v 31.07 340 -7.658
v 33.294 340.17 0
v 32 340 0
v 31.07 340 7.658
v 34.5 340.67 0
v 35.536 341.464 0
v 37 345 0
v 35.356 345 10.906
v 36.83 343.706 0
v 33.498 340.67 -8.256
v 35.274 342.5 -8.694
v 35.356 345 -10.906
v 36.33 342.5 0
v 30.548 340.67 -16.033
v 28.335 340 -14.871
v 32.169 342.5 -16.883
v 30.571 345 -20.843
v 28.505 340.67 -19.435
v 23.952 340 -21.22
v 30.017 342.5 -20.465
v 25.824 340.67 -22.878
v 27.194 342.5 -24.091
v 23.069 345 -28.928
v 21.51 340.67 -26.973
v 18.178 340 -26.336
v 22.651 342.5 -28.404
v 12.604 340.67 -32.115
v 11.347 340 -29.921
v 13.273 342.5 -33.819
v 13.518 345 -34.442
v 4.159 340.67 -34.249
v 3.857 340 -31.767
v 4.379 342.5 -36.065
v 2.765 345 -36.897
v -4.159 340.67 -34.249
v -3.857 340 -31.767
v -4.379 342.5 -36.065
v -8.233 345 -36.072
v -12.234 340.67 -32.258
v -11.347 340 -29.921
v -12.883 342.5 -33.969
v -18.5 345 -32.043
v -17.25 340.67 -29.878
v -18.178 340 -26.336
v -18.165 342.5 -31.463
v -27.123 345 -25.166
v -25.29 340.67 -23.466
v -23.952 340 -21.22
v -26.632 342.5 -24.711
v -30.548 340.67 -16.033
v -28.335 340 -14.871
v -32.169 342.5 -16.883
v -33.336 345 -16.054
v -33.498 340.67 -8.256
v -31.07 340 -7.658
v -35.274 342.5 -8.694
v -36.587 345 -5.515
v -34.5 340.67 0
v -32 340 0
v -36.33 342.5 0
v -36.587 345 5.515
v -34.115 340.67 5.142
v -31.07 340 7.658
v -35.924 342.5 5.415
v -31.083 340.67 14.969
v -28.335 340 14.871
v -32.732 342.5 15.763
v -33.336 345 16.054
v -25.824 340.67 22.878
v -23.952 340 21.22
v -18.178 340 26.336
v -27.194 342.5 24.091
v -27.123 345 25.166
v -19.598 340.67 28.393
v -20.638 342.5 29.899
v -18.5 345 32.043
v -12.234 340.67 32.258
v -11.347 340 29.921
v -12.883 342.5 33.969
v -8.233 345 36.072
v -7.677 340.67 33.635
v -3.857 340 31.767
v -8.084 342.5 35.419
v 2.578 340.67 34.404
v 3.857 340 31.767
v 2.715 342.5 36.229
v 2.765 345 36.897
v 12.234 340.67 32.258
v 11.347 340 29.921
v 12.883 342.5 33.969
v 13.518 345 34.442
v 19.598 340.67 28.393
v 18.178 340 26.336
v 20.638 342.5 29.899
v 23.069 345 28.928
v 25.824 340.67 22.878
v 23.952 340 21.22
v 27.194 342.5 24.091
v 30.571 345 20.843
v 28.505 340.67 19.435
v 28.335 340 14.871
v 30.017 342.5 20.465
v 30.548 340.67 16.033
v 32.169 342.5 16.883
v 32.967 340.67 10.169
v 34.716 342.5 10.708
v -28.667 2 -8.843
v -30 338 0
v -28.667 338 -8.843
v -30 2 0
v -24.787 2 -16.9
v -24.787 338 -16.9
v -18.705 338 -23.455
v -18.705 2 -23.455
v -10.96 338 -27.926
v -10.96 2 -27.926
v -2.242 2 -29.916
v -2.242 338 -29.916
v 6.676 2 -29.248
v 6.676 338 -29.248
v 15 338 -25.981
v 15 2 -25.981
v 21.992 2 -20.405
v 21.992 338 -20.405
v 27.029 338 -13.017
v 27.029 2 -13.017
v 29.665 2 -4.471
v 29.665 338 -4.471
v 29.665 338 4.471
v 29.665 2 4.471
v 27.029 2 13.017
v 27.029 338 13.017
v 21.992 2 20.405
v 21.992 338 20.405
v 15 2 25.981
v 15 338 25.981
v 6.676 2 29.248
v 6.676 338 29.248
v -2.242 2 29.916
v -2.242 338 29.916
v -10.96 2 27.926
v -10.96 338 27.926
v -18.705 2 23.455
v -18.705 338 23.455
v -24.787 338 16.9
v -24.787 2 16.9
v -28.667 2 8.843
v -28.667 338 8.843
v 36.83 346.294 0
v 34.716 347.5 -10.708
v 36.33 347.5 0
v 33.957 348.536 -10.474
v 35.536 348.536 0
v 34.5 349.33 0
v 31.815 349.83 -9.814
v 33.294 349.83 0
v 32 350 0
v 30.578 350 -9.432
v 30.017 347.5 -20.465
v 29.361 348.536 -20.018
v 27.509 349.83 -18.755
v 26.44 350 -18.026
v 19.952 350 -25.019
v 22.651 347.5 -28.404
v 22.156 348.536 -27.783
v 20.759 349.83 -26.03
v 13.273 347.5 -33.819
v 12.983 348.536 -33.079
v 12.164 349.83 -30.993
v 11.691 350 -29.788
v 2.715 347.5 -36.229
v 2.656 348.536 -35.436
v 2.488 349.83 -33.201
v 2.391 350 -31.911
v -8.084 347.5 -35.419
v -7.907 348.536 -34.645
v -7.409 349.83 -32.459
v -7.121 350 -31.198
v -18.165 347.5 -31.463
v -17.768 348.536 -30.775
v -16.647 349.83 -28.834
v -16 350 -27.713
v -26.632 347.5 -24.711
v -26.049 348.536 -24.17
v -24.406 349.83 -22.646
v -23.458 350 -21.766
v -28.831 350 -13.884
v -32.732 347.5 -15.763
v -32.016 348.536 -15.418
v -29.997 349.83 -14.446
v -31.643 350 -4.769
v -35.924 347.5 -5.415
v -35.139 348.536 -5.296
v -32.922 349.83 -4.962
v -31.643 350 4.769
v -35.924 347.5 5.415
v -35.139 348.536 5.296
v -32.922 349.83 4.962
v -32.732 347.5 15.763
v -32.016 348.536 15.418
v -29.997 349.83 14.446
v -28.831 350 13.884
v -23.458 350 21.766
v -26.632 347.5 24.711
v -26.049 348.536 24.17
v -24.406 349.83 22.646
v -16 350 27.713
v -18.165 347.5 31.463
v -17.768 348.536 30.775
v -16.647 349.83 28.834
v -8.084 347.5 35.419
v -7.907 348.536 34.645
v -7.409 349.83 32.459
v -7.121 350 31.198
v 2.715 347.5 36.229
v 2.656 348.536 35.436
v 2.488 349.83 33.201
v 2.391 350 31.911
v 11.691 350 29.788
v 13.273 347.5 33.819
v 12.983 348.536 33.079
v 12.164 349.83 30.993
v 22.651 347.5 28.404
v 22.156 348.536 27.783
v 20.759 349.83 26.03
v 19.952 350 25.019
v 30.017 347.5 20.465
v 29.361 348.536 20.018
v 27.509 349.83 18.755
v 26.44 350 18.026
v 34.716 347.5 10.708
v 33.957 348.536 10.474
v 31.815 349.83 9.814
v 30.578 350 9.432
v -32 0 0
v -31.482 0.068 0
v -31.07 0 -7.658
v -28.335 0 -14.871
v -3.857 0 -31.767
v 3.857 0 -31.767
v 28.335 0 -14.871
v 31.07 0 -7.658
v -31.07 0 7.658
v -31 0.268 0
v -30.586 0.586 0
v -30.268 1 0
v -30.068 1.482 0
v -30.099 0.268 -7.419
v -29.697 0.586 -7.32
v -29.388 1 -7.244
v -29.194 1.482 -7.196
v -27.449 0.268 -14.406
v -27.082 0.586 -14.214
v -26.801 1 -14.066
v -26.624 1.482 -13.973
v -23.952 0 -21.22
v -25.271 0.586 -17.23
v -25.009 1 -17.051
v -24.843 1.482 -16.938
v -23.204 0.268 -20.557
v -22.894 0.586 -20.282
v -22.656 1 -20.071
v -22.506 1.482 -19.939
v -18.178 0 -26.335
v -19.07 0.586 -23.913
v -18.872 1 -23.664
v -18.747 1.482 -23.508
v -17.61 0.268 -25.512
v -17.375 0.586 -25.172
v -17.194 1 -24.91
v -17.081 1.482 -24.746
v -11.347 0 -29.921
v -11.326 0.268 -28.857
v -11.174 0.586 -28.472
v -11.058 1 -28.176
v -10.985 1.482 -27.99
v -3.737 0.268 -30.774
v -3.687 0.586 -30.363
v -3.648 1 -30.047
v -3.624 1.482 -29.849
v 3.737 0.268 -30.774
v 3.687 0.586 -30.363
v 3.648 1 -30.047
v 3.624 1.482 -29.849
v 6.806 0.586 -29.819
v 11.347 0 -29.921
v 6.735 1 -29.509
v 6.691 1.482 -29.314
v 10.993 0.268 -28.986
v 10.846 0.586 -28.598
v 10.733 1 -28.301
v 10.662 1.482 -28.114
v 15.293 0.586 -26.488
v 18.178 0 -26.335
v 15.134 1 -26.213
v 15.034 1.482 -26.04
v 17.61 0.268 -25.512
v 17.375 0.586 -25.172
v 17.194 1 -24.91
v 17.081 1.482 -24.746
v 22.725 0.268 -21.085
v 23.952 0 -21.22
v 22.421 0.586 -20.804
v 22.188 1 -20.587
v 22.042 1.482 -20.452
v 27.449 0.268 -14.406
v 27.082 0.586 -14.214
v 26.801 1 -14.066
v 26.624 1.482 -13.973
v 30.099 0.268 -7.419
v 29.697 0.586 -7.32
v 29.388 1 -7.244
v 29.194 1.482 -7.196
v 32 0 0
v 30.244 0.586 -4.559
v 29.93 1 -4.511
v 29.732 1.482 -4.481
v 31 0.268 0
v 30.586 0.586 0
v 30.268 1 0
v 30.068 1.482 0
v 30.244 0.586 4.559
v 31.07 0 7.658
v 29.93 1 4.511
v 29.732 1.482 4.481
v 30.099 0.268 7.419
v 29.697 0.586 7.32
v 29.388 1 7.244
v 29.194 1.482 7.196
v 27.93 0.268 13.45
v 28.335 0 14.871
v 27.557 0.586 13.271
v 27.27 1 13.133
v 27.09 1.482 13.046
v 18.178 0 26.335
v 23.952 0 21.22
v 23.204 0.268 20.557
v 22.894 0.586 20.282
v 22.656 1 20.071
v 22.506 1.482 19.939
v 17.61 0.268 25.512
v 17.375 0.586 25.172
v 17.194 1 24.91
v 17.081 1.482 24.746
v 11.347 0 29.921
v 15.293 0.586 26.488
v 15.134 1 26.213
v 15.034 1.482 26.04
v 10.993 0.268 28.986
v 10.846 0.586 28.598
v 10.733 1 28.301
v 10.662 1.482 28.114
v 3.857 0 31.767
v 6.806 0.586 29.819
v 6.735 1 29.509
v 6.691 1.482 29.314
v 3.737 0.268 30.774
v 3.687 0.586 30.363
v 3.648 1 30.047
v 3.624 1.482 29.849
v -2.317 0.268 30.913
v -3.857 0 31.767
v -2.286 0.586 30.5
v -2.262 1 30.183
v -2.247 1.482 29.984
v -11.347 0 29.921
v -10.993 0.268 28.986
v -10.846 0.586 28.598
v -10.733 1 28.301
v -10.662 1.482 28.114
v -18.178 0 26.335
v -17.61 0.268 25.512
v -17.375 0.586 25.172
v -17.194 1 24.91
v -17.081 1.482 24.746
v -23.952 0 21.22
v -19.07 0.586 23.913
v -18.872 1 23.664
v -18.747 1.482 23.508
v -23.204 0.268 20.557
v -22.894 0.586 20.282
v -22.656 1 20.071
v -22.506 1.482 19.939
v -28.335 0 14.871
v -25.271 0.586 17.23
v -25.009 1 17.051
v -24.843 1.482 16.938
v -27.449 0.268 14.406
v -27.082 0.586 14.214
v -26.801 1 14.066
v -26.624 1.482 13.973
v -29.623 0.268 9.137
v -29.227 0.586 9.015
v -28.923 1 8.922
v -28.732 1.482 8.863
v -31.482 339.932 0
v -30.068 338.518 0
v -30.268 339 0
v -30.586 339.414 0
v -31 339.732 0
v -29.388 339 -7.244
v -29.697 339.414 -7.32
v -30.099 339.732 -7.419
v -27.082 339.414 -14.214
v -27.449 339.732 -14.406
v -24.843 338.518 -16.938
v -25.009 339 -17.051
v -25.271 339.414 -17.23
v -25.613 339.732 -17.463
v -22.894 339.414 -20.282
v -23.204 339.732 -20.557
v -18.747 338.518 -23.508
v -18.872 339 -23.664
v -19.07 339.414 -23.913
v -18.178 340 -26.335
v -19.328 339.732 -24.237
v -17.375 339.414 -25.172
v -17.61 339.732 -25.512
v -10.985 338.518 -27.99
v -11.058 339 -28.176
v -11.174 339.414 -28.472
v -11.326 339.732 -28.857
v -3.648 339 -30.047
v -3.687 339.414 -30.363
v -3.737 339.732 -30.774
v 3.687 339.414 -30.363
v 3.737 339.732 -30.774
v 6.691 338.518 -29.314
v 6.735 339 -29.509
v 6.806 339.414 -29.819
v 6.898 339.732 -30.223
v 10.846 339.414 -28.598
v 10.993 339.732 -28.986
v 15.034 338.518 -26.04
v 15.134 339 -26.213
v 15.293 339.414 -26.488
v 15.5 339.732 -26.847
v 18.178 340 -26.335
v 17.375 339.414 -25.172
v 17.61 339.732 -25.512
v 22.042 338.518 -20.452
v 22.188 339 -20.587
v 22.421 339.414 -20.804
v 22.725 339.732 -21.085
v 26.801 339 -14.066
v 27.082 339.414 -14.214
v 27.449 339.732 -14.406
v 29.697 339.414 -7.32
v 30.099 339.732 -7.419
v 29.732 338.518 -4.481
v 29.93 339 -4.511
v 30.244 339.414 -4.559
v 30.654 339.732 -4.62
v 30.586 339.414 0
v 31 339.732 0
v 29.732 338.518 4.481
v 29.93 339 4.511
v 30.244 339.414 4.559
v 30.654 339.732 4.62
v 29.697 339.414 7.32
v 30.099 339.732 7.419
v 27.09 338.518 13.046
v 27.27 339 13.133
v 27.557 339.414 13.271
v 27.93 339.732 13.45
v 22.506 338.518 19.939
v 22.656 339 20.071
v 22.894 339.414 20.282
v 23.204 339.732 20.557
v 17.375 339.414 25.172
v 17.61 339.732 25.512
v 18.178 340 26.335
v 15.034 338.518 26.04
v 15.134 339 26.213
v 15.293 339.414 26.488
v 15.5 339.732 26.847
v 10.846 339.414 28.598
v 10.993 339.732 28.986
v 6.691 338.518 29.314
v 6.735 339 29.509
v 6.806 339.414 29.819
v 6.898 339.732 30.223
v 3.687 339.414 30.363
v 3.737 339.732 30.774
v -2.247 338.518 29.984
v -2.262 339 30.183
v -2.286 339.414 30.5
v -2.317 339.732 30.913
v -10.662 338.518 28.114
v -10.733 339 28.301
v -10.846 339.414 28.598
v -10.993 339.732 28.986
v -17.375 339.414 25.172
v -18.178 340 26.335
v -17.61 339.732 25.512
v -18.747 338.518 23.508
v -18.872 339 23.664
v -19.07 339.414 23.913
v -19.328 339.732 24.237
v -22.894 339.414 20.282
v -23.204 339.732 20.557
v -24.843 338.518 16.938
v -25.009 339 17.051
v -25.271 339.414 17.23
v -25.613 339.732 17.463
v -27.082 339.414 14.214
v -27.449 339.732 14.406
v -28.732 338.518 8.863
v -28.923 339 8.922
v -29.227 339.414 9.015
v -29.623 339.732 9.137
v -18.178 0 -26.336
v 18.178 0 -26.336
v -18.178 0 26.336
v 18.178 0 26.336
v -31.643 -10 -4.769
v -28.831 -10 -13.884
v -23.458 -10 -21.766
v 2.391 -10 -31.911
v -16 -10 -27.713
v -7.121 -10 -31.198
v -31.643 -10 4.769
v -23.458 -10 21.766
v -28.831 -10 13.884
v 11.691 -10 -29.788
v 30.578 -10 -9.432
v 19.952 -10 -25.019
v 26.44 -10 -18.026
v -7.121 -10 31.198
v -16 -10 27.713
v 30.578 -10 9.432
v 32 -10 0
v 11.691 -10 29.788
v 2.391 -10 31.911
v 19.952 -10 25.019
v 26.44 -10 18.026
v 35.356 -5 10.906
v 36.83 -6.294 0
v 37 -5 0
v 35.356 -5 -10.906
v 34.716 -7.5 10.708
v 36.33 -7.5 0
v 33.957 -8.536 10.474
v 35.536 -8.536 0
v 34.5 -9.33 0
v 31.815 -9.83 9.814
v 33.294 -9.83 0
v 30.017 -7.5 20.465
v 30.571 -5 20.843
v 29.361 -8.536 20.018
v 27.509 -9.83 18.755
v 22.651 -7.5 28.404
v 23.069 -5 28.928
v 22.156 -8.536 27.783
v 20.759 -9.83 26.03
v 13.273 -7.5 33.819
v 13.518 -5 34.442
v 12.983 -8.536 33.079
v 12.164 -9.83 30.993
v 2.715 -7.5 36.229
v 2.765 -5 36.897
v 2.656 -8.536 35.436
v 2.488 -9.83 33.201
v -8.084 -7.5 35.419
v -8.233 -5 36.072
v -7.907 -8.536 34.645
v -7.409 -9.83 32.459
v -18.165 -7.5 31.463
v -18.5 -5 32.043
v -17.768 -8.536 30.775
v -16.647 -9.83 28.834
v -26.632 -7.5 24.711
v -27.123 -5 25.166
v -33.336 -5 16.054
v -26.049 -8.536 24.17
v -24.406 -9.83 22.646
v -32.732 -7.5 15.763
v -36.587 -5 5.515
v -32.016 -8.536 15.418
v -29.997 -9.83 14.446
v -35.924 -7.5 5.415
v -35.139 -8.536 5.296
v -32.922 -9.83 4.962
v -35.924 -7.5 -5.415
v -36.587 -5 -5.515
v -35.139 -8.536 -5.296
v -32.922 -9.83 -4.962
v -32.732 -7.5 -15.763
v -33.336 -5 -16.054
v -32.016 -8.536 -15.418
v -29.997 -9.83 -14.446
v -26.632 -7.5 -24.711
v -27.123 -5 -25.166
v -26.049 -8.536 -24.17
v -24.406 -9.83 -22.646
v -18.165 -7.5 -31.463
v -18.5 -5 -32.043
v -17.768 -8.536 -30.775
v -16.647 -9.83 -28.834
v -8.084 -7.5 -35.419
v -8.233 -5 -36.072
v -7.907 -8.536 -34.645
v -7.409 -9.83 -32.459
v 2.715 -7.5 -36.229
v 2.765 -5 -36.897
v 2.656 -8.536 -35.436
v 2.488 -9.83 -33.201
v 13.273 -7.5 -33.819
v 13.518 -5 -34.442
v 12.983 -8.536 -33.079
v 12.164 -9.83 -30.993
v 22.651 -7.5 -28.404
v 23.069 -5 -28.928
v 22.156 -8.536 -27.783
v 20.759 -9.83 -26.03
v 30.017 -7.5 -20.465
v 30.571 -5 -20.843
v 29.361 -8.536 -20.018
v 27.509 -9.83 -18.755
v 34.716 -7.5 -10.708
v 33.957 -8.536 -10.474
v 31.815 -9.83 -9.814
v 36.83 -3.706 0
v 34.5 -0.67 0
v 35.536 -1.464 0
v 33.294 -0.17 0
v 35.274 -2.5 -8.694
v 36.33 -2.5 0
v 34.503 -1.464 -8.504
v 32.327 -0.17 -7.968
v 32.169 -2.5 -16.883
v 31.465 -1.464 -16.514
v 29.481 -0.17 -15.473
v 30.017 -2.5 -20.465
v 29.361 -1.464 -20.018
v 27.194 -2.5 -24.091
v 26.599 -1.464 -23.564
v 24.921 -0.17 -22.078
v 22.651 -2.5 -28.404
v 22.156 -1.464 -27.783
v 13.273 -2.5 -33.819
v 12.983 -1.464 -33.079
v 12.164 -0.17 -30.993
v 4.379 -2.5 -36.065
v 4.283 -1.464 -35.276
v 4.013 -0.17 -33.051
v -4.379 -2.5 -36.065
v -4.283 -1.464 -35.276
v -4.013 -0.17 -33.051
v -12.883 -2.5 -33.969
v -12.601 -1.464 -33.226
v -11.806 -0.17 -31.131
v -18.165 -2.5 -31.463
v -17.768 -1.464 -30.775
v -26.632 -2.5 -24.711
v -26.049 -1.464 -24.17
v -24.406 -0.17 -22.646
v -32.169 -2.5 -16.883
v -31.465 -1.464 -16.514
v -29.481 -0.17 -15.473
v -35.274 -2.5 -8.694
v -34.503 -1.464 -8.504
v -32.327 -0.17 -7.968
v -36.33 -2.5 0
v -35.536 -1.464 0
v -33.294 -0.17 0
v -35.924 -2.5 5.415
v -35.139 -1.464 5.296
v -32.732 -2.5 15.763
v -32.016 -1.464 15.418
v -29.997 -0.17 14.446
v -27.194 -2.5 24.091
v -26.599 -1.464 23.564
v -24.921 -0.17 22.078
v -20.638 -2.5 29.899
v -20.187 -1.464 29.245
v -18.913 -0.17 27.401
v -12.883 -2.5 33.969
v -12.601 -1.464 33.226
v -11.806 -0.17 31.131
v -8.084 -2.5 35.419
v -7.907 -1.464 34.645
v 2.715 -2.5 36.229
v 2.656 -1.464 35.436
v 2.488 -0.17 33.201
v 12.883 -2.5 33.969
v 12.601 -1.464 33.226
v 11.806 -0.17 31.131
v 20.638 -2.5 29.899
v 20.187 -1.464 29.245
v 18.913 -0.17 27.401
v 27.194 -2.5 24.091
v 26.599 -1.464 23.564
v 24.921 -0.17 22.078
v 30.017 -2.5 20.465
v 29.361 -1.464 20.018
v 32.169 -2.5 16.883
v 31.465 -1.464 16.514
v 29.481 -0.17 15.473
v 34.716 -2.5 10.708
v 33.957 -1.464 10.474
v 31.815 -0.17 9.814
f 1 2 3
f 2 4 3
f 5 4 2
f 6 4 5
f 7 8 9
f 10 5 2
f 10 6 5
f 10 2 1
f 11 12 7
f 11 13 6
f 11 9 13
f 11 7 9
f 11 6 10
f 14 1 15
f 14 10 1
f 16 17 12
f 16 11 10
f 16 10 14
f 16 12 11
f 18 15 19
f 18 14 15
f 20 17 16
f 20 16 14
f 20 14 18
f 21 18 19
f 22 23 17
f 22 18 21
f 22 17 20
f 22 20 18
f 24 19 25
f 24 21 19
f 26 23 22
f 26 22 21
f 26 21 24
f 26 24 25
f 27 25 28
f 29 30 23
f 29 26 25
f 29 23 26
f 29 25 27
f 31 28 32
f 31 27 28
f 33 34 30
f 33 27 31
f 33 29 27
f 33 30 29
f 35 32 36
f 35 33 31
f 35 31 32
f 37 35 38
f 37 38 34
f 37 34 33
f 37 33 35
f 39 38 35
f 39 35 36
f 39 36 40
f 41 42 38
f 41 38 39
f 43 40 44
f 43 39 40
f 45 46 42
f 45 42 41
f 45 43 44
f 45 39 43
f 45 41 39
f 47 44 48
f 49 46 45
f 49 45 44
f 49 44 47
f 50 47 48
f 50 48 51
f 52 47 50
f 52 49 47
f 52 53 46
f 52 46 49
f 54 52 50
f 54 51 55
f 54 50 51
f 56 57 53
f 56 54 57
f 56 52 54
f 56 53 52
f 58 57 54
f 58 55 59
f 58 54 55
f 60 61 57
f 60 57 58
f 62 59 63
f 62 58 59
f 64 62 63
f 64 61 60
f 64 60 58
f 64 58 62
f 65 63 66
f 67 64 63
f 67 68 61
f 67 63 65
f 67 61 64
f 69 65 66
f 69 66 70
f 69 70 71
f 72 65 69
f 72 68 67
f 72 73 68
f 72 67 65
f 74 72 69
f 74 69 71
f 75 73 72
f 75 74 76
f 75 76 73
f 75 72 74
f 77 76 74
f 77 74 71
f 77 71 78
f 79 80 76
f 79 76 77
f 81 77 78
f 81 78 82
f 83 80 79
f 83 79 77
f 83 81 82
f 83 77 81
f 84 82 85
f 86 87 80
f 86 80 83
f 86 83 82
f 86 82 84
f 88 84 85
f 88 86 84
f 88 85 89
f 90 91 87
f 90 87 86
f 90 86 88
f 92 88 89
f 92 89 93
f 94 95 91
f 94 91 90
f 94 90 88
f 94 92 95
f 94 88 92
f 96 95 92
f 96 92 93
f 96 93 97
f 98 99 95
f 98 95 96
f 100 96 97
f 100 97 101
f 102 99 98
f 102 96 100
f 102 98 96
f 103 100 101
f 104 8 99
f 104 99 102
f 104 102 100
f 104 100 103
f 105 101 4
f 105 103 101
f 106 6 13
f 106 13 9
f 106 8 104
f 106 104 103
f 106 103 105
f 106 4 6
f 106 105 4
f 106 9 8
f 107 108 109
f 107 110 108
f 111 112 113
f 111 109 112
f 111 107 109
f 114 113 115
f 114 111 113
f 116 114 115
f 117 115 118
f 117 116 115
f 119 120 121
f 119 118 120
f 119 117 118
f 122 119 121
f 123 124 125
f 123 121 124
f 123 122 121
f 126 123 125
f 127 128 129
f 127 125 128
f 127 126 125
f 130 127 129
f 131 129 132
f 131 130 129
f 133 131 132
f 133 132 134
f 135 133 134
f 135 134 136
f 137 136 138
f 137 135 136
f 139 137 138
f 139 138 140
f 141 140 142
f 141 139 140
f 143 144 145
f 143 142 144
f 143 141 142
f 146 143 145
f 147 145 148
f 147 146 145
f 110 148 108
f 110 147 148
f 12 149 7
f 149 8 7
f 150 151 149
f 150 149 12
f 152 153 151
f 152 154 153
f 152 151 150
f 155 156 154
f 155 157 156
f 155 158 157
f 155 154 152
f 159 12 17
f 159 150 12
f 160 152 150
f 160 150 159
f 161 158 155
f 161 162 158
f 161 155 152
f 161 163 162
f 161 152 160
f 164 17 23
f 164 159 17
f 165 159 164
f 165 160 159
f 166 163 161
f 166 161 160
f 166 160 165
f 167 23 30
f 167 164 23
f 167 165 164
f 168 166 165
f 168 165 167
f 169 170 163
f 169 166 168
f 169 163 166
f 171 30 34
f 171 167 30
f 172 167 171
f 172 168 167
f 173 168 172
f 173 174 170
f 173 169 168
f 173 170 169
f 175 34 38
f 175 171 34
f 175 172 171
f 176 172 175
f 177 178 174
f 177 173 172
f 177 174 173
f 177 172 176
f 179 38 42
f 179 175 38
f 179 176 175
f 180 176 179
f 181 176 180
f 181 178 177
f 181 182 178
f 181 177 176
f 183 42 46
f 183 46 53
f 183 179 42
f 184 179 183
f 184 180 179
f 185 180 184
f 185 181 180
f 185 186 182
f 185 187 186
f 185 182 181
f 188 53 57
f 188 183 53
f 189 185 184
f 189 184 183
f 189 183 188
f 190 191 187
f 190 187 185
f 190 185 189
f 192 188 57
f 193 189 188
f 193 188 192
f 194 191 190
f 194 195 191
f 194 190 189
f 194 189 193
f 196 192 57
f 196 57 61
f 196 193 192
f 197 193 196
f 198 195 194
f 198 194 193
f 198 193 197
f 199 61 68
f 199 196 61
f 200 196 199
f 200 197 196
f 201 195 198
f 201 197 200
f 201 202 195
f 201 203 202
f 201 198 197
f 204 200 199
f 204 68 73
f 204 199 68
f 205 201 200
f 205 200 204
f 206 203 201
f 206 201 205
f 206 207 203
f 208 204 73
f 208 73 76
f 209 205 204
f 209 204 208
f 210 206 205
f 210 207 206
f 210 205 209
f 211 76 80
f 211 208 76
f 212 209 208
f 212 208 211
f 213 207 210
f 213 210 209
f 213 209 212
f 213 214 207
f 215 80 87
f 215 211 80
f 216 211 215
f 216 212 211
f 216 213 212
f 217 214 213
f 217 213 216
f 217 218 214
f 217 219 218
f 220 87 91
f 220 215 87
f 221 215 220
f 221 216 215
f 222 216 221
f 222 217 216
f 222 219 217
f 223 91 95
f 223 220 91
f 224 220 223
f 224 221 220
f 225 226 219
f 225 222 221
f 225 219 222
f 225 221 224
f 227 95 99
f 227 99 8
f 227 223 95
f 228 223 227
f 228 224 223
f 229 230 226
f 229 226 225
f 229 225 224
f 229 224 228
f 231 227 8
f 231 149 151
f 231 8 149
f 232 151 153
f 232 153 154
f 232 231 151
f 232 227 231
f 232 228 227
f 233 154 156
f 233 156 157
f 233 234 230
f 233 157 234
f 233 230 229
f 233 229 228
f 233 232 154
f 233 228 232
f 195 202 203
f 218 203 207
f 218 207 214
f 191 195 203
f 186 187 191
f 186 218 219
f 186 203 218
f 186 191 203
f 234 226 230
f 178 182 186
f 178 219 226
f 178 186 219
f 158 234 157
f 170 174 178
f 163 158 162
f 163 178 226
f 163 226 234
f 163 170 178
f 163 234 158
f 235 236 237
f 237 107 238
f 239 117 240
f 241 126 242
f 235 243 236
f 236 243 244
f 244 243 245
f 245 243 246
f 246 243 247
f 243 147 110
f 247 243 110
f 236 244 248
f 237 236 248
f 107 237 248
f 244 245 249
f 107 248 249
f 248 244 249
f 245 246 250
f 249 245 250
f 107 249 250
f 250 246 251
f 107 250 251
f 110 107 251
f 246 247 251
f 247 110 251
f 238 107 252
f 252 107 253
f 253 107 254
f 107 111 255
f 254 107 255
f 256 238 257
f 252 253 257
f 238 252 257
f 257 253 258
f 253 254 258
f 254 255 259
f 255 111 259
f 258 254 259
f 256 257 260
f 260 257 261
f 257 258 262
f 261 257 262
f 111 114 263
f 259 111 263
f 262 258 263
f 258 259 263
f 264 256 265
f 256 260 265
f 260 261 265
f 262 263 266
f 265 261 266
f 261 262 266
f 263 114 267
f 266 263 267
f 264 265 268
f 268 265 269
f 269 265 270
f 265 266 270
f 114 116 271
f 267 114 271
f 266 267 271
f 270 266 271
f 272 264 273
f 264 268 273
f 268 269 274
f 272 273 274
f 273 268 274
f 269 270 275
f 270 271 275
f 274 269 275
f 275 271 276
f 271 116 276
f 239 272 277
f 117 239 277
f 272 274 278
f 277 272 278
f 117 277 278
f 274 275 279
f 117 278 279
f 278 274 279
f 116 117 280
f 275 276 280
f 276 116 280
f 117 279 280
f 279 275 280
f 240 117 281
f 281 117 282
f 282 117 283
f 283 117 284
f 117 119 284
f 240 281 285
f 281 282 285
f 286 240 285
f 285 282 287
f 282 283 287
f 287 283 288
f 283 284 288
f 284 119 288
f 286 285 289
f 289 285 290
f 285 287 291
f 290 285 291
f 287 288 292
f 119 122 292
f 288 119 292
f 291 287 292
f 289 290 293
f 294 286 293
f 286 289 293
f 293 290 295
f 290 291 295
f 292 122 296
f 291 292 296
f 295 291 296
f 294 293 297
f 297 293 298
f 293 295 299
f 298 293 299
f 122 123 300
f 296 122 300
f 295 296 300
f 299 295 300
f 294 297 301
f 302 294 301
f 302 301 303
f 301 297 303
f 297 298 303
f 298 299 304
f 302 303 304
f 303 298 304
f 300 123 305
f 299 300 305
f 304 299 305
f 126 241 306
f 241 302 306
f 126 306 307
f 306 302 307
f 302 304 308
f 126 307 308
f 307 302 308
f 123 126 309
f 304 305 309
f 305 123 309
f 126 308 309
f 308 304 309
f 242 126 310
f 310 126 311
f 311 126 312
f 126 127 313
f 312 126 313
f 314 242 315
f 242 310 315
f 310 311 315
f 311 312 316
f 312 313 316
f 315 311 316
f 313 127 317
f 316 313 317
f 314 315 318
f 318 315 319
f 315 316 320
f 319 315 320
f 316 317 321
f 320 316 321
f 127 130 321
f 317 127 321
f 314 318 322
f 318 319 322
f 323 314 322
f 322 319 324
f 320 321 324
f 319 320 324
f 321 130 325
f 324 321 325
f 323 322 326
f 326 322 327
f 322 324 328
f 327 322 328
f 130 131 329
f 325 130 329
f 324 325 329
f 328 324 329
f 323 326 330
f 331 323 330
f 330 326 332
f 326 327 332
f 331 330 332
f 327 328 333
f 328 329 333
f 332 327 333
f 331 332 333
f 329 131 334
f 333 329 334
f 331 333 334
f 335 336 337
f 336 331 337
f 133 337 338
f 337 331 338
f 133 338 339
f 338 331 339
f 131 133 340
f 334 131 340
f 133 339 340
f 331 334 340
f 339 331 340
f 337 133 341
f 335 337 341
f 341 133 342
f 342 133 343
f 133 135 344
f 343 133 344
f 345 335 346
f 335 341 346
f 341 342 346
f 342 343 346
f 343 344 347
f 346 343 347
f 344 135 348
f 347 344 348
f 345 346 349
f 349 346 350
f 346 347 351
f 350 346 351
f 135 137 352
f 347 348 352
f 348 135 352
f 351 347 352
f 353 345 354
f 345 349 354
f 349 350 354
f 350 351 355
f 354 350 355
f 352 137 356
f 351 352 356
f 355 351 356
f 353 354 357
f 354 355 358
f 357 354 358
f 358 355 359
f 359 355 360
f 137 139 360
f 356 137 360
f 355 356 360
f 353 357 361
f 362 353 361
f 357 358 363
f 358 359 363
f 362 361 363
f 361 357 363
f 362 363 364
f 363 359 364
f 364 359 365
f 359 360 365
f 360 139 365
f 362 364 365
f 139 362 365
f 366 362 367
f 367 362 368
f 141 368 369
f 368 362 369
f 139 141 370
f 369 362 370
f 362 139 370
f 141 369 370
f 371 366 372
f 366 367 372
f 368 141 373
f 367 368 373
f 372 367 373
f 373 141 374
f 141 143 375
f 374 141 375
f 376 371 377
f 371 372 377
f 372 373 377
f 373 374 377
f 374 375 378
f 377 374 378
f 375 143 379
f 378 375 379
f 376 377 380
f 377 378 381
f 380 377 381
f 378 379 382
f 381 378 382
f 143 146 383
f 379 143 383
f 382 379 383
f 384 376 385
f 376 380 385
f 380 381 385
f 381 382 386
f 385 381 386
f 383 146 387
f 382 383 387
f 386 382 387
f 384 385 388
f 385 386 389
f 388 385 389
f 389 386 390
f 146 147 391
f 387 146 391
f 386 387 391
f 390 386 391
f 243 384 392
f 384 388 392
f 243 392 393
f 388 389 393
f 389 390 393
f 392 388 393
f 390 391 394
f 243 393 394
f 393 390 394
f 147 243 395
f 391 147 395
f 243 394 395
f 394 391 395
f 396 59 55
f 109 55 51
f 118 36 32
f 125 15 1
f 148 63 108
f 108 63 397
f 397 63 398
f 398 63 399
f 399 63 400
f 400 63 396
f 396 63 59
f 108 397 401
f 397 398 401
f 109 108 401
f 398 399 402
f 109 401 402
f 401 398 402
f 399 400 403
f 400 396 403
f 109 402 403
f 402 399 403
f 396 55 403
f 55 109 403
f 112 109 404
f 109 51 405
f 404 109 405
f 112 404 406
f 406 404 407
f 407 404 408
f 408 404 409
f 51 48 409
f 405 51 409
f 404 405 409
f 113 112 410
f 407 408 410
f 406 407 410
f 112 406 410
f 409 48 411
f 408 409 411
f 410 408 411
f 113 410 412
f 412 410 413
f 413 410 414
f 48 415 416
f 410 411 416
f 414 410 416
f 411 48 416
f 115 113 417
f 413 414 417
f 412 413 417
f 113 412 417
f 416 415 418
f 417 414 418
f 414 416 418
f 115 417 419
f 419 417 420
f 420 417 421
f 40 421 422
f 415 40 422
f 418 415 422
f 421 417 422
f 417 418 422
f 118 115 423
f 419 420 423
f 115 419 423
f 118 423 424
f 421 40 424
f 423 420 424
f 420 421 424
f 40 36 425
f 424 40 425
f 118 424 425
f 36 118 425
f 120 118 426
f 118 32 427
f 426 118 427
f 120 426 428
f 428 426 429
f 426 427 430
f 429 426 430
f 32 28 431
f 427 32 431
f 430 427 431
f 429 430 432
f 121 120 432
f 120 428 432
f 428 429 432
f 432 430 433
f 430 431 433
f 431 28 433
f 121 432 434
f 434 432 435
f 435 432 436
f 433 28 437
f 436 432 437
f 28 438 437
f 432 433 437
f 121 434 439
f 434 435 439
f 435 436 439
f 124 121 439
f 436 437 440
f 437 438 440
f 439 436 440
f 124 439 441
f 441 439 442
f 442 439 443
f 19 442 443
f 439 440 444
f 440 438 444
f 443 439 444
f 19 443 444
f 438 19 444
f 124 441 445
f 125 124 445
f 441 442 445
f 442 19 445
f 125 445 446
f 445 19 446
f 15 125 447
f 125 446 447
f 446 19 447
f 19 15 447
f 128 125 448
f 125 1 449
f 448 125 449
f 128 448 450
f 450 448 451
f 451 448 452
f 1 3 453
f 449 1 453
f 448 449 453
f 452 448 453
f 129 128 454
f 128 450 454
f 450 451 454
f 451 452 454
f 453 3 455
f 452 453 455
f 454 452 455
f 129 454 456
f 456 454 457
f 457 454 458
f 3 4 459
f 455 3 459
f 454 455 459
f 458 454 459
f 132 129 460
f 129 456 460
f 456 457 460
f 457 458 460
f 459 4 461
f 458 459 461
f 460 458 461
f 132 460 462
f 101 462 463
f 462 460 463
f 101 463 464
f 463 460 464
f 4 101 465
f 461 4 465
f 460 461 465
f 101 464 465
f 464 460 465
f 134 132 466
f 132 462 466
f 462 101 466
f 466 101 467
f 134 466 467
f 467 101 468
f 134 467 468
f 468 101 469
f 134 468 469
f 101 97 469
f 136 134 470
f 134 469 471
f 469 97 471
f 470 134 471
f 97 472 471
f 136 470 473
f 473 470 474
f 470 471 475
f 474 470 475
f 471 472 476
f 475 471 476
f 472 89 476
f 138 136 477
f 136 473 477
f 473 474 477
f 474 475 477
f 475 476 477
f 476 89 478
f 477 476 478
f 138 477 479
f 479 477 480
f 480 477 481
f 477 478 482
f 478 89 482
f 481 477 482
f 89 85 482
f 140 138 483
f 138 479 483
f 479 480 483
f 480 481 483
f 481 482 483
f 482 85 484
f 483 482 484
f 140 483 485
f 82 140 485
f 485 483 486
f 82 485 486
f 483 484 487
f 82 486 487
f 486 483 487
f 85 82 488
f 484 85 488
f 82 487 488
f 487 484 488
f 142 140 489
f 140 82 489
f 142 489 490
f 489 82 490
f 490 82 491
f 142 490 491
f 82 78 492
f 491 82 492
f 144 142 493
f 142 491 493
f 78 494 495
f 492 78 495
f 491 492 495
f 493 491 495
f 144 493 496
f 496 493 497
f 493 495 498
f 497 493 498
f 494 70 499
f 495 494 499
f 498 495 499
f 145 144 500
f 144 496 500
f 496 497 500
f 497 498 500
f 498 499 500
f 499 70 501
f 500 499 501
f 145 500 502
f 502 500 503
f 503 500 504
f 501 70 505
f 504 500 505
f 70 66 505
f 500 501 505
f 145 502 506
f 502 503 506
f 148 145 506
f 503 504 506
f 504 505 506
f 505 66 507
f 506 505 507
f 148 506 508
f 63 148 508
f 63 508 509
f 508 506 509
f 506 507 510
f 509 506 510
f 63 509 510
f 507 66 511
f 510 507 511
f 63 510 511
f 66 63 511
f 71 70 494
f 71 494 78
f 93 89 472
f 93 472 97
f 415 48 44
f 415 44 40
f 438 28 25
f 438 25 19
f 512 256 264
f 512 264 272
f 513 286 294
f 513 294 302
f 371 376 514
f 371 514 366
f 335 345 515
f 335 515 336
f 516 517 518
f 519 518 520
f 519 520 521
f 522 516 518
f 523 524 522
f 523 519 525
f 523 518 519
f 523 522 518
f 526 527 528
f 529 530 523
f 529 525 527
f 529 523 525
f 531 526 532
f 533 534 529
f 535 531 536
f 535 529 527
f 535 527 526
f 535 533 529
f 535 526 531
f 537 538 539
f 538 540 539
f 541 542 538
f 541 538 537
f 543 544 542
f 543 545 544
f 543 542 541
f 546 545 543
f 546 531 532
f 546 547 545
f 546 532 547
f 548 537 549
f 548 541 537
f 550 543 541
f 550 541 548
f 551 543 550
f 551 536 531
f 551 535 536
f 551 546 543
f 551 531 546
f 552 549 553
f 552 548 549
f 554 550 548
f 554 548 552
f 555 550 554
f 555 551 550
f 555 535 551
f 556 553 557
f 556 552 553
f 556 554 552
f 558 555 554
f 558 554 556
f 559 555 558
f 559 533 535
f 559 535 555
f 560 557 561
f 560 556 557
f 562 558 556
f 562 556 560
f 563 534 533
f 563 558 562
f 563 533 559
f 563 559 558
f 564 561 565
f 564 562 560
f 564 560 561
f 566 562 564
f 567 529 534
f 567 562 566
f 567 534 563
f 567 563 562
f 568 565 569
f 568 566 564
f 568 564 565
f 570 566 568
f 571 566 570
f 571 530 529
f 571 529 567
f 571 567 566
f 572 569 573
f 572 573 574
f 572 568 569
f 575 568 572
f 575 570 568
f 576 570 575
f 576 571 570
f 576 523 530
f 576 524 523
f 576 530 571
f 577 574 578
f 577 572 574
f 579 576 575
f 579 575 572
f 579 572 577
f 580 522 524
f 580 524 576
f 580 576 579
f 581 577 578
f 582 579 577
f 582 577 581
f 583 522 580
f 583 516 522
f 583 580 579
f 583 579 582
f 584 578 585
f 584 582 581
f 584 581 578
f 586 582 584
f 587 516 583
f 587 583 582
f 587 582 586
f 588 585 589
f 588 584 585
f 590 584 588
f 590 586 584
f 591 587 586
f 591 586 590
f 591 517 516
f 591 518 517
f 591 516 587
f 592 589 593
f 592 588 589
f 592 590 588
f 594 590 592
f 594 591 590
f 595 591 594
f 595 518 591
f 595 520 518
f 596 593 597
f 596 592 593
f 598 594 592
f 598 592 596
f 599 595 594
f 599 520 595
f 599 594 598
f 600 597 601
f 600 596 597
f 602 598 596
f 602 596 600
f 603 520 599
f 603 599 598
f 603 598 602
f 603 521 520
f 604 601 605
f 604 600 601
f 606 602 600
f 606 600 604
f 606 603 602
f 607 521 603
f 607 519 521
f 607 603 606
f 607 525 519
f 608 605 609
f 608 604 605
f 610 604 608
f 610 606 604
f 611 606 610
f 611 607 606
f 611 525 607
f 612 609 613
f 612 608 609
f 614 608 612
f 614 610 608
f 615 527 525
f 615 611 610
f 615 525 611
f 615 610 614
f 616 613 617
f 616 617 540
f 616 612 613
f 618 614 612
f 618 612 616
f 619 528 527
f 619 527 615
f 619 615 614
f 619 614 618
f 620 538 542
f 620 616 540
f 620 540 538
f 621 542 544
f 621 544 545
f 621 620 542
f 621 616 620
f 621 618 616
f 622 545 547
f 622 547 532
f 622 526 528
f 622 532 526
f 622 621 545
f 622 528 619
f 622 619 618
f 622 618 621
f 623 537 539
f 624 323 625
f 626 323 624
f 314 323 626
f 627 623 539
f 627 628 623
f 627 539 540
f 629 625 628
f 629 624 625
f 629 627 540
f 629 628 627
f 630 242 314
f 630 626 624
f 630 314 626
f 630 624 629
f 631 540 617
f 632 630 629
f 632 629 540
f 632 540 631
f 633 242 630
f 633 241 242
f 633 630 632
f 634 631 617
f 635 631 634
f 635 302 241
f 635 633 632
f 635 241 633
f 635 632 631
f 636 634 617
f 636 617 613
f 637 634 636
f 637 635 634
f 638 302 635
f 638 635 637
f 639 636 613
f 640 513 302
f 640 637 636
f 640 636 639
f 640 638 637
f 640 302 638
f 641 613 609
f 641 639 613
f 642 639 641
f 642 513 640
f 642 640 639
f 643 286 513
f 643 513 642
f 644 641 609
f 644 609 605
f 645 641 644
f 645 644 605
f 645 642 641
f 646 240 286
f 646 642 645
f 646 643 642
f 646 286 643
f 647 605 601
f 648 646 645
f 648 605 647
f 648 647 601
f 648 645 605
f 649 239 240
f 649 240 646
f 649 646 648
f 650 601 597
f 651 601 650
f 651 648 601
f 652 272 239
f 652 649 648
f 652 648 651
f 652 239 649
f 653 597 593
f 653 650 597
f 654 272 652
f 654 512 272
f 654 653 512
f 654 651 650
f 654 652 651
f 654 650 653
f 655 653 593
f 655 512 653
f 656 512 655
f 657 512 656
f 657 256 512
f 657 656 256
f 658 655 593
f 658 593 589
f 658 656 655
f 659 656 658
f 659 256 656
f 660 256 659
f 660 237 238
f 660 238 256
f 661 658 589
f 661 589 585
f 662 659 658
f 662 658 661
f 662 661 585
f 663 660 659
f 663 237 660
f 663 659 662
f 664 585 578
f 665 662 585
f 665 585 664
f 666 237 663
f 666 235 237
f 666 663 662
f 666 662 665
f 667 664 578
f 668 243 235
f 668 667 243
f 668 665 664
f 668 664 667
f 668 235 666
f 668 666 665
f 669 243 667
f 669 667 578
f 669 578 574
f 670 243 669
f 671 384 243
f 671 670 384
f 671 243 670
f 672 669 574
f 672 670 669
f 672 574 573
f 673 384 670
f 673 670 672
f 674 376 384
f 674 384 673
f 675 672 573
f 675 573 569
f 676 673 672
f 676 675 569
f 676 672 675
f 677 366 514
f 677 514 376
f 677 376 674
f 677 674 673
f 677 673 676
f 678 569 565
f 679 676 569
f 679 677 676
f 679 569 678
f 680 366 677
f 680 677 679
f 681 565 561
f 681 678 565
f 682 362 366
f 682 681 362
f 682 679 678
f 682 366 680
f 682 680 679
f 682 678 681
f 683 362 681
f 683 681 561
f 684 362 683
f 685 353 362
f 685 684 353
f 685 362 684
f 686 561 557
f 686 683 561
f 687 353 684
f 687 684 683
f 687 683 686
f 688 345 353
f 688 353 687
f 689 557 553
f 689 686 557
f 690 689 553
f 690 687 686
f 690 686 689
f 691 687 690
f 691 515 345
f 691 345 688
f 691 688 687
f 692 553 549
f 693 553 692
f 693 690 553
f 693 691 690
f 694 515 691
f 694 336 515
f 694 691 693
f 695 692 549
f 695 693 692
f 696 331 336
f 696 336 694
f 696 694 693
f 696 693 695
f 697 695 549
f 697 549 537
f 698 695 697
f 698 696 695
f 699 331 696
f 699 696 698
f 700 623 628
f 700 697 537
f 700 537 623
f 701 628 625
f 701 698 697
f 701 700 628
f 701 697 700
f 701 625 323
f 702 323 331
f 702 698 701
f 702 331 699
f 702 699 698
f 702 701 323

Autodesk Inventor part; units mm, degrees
ref_plane "YZ Plane" through (0, 0, 0) normal (1, 0, 0) x (0, 1, 0)
ref_plane "XZ Plane" through (0, 0, 0) normal (0, 1, 0) x (-1, 0, 0)
ref_plane "XY Plane" through (0, 0, 0) normal (0, 0, 1) x (1, 0, 0)
sketch "草图1" plane through (0, 0, 0) normal (0, 1, 0) x (-1, 0, 0)
  circle A0 centre (0, 0) radius 30
  dimension "d0" = 60
extrude "拉伸1" add sketch "草图1" along normal blind 340
sketch "草图2" plane through (0, 340, 0) normal (0, 1, 0) x (1, 0, 0)
  circle A0 centre (0, 0) radius 37
extrude "拉伸2" add sketch "草图2" along normal blind 10
sketch "草图3" plane through (0, 0, 0) normal (0, -1, 0) x (1, 0, 0)
  circle A0 centre (0, 0) radius 37
extrude "拉伸3" add sketch "草图3" along normal blind 10
fillet "圆角1" radius 5 4 edges at (-37, 350, 0) (-37, 340, 0) (-37, 0, 0) (-37, -10, 0)
fillet "圆角2" radius 2 2 edges at (30, 340, 0) (30, 0, 0)
properties part number "销钉" material "钢，高强度，低合金"
